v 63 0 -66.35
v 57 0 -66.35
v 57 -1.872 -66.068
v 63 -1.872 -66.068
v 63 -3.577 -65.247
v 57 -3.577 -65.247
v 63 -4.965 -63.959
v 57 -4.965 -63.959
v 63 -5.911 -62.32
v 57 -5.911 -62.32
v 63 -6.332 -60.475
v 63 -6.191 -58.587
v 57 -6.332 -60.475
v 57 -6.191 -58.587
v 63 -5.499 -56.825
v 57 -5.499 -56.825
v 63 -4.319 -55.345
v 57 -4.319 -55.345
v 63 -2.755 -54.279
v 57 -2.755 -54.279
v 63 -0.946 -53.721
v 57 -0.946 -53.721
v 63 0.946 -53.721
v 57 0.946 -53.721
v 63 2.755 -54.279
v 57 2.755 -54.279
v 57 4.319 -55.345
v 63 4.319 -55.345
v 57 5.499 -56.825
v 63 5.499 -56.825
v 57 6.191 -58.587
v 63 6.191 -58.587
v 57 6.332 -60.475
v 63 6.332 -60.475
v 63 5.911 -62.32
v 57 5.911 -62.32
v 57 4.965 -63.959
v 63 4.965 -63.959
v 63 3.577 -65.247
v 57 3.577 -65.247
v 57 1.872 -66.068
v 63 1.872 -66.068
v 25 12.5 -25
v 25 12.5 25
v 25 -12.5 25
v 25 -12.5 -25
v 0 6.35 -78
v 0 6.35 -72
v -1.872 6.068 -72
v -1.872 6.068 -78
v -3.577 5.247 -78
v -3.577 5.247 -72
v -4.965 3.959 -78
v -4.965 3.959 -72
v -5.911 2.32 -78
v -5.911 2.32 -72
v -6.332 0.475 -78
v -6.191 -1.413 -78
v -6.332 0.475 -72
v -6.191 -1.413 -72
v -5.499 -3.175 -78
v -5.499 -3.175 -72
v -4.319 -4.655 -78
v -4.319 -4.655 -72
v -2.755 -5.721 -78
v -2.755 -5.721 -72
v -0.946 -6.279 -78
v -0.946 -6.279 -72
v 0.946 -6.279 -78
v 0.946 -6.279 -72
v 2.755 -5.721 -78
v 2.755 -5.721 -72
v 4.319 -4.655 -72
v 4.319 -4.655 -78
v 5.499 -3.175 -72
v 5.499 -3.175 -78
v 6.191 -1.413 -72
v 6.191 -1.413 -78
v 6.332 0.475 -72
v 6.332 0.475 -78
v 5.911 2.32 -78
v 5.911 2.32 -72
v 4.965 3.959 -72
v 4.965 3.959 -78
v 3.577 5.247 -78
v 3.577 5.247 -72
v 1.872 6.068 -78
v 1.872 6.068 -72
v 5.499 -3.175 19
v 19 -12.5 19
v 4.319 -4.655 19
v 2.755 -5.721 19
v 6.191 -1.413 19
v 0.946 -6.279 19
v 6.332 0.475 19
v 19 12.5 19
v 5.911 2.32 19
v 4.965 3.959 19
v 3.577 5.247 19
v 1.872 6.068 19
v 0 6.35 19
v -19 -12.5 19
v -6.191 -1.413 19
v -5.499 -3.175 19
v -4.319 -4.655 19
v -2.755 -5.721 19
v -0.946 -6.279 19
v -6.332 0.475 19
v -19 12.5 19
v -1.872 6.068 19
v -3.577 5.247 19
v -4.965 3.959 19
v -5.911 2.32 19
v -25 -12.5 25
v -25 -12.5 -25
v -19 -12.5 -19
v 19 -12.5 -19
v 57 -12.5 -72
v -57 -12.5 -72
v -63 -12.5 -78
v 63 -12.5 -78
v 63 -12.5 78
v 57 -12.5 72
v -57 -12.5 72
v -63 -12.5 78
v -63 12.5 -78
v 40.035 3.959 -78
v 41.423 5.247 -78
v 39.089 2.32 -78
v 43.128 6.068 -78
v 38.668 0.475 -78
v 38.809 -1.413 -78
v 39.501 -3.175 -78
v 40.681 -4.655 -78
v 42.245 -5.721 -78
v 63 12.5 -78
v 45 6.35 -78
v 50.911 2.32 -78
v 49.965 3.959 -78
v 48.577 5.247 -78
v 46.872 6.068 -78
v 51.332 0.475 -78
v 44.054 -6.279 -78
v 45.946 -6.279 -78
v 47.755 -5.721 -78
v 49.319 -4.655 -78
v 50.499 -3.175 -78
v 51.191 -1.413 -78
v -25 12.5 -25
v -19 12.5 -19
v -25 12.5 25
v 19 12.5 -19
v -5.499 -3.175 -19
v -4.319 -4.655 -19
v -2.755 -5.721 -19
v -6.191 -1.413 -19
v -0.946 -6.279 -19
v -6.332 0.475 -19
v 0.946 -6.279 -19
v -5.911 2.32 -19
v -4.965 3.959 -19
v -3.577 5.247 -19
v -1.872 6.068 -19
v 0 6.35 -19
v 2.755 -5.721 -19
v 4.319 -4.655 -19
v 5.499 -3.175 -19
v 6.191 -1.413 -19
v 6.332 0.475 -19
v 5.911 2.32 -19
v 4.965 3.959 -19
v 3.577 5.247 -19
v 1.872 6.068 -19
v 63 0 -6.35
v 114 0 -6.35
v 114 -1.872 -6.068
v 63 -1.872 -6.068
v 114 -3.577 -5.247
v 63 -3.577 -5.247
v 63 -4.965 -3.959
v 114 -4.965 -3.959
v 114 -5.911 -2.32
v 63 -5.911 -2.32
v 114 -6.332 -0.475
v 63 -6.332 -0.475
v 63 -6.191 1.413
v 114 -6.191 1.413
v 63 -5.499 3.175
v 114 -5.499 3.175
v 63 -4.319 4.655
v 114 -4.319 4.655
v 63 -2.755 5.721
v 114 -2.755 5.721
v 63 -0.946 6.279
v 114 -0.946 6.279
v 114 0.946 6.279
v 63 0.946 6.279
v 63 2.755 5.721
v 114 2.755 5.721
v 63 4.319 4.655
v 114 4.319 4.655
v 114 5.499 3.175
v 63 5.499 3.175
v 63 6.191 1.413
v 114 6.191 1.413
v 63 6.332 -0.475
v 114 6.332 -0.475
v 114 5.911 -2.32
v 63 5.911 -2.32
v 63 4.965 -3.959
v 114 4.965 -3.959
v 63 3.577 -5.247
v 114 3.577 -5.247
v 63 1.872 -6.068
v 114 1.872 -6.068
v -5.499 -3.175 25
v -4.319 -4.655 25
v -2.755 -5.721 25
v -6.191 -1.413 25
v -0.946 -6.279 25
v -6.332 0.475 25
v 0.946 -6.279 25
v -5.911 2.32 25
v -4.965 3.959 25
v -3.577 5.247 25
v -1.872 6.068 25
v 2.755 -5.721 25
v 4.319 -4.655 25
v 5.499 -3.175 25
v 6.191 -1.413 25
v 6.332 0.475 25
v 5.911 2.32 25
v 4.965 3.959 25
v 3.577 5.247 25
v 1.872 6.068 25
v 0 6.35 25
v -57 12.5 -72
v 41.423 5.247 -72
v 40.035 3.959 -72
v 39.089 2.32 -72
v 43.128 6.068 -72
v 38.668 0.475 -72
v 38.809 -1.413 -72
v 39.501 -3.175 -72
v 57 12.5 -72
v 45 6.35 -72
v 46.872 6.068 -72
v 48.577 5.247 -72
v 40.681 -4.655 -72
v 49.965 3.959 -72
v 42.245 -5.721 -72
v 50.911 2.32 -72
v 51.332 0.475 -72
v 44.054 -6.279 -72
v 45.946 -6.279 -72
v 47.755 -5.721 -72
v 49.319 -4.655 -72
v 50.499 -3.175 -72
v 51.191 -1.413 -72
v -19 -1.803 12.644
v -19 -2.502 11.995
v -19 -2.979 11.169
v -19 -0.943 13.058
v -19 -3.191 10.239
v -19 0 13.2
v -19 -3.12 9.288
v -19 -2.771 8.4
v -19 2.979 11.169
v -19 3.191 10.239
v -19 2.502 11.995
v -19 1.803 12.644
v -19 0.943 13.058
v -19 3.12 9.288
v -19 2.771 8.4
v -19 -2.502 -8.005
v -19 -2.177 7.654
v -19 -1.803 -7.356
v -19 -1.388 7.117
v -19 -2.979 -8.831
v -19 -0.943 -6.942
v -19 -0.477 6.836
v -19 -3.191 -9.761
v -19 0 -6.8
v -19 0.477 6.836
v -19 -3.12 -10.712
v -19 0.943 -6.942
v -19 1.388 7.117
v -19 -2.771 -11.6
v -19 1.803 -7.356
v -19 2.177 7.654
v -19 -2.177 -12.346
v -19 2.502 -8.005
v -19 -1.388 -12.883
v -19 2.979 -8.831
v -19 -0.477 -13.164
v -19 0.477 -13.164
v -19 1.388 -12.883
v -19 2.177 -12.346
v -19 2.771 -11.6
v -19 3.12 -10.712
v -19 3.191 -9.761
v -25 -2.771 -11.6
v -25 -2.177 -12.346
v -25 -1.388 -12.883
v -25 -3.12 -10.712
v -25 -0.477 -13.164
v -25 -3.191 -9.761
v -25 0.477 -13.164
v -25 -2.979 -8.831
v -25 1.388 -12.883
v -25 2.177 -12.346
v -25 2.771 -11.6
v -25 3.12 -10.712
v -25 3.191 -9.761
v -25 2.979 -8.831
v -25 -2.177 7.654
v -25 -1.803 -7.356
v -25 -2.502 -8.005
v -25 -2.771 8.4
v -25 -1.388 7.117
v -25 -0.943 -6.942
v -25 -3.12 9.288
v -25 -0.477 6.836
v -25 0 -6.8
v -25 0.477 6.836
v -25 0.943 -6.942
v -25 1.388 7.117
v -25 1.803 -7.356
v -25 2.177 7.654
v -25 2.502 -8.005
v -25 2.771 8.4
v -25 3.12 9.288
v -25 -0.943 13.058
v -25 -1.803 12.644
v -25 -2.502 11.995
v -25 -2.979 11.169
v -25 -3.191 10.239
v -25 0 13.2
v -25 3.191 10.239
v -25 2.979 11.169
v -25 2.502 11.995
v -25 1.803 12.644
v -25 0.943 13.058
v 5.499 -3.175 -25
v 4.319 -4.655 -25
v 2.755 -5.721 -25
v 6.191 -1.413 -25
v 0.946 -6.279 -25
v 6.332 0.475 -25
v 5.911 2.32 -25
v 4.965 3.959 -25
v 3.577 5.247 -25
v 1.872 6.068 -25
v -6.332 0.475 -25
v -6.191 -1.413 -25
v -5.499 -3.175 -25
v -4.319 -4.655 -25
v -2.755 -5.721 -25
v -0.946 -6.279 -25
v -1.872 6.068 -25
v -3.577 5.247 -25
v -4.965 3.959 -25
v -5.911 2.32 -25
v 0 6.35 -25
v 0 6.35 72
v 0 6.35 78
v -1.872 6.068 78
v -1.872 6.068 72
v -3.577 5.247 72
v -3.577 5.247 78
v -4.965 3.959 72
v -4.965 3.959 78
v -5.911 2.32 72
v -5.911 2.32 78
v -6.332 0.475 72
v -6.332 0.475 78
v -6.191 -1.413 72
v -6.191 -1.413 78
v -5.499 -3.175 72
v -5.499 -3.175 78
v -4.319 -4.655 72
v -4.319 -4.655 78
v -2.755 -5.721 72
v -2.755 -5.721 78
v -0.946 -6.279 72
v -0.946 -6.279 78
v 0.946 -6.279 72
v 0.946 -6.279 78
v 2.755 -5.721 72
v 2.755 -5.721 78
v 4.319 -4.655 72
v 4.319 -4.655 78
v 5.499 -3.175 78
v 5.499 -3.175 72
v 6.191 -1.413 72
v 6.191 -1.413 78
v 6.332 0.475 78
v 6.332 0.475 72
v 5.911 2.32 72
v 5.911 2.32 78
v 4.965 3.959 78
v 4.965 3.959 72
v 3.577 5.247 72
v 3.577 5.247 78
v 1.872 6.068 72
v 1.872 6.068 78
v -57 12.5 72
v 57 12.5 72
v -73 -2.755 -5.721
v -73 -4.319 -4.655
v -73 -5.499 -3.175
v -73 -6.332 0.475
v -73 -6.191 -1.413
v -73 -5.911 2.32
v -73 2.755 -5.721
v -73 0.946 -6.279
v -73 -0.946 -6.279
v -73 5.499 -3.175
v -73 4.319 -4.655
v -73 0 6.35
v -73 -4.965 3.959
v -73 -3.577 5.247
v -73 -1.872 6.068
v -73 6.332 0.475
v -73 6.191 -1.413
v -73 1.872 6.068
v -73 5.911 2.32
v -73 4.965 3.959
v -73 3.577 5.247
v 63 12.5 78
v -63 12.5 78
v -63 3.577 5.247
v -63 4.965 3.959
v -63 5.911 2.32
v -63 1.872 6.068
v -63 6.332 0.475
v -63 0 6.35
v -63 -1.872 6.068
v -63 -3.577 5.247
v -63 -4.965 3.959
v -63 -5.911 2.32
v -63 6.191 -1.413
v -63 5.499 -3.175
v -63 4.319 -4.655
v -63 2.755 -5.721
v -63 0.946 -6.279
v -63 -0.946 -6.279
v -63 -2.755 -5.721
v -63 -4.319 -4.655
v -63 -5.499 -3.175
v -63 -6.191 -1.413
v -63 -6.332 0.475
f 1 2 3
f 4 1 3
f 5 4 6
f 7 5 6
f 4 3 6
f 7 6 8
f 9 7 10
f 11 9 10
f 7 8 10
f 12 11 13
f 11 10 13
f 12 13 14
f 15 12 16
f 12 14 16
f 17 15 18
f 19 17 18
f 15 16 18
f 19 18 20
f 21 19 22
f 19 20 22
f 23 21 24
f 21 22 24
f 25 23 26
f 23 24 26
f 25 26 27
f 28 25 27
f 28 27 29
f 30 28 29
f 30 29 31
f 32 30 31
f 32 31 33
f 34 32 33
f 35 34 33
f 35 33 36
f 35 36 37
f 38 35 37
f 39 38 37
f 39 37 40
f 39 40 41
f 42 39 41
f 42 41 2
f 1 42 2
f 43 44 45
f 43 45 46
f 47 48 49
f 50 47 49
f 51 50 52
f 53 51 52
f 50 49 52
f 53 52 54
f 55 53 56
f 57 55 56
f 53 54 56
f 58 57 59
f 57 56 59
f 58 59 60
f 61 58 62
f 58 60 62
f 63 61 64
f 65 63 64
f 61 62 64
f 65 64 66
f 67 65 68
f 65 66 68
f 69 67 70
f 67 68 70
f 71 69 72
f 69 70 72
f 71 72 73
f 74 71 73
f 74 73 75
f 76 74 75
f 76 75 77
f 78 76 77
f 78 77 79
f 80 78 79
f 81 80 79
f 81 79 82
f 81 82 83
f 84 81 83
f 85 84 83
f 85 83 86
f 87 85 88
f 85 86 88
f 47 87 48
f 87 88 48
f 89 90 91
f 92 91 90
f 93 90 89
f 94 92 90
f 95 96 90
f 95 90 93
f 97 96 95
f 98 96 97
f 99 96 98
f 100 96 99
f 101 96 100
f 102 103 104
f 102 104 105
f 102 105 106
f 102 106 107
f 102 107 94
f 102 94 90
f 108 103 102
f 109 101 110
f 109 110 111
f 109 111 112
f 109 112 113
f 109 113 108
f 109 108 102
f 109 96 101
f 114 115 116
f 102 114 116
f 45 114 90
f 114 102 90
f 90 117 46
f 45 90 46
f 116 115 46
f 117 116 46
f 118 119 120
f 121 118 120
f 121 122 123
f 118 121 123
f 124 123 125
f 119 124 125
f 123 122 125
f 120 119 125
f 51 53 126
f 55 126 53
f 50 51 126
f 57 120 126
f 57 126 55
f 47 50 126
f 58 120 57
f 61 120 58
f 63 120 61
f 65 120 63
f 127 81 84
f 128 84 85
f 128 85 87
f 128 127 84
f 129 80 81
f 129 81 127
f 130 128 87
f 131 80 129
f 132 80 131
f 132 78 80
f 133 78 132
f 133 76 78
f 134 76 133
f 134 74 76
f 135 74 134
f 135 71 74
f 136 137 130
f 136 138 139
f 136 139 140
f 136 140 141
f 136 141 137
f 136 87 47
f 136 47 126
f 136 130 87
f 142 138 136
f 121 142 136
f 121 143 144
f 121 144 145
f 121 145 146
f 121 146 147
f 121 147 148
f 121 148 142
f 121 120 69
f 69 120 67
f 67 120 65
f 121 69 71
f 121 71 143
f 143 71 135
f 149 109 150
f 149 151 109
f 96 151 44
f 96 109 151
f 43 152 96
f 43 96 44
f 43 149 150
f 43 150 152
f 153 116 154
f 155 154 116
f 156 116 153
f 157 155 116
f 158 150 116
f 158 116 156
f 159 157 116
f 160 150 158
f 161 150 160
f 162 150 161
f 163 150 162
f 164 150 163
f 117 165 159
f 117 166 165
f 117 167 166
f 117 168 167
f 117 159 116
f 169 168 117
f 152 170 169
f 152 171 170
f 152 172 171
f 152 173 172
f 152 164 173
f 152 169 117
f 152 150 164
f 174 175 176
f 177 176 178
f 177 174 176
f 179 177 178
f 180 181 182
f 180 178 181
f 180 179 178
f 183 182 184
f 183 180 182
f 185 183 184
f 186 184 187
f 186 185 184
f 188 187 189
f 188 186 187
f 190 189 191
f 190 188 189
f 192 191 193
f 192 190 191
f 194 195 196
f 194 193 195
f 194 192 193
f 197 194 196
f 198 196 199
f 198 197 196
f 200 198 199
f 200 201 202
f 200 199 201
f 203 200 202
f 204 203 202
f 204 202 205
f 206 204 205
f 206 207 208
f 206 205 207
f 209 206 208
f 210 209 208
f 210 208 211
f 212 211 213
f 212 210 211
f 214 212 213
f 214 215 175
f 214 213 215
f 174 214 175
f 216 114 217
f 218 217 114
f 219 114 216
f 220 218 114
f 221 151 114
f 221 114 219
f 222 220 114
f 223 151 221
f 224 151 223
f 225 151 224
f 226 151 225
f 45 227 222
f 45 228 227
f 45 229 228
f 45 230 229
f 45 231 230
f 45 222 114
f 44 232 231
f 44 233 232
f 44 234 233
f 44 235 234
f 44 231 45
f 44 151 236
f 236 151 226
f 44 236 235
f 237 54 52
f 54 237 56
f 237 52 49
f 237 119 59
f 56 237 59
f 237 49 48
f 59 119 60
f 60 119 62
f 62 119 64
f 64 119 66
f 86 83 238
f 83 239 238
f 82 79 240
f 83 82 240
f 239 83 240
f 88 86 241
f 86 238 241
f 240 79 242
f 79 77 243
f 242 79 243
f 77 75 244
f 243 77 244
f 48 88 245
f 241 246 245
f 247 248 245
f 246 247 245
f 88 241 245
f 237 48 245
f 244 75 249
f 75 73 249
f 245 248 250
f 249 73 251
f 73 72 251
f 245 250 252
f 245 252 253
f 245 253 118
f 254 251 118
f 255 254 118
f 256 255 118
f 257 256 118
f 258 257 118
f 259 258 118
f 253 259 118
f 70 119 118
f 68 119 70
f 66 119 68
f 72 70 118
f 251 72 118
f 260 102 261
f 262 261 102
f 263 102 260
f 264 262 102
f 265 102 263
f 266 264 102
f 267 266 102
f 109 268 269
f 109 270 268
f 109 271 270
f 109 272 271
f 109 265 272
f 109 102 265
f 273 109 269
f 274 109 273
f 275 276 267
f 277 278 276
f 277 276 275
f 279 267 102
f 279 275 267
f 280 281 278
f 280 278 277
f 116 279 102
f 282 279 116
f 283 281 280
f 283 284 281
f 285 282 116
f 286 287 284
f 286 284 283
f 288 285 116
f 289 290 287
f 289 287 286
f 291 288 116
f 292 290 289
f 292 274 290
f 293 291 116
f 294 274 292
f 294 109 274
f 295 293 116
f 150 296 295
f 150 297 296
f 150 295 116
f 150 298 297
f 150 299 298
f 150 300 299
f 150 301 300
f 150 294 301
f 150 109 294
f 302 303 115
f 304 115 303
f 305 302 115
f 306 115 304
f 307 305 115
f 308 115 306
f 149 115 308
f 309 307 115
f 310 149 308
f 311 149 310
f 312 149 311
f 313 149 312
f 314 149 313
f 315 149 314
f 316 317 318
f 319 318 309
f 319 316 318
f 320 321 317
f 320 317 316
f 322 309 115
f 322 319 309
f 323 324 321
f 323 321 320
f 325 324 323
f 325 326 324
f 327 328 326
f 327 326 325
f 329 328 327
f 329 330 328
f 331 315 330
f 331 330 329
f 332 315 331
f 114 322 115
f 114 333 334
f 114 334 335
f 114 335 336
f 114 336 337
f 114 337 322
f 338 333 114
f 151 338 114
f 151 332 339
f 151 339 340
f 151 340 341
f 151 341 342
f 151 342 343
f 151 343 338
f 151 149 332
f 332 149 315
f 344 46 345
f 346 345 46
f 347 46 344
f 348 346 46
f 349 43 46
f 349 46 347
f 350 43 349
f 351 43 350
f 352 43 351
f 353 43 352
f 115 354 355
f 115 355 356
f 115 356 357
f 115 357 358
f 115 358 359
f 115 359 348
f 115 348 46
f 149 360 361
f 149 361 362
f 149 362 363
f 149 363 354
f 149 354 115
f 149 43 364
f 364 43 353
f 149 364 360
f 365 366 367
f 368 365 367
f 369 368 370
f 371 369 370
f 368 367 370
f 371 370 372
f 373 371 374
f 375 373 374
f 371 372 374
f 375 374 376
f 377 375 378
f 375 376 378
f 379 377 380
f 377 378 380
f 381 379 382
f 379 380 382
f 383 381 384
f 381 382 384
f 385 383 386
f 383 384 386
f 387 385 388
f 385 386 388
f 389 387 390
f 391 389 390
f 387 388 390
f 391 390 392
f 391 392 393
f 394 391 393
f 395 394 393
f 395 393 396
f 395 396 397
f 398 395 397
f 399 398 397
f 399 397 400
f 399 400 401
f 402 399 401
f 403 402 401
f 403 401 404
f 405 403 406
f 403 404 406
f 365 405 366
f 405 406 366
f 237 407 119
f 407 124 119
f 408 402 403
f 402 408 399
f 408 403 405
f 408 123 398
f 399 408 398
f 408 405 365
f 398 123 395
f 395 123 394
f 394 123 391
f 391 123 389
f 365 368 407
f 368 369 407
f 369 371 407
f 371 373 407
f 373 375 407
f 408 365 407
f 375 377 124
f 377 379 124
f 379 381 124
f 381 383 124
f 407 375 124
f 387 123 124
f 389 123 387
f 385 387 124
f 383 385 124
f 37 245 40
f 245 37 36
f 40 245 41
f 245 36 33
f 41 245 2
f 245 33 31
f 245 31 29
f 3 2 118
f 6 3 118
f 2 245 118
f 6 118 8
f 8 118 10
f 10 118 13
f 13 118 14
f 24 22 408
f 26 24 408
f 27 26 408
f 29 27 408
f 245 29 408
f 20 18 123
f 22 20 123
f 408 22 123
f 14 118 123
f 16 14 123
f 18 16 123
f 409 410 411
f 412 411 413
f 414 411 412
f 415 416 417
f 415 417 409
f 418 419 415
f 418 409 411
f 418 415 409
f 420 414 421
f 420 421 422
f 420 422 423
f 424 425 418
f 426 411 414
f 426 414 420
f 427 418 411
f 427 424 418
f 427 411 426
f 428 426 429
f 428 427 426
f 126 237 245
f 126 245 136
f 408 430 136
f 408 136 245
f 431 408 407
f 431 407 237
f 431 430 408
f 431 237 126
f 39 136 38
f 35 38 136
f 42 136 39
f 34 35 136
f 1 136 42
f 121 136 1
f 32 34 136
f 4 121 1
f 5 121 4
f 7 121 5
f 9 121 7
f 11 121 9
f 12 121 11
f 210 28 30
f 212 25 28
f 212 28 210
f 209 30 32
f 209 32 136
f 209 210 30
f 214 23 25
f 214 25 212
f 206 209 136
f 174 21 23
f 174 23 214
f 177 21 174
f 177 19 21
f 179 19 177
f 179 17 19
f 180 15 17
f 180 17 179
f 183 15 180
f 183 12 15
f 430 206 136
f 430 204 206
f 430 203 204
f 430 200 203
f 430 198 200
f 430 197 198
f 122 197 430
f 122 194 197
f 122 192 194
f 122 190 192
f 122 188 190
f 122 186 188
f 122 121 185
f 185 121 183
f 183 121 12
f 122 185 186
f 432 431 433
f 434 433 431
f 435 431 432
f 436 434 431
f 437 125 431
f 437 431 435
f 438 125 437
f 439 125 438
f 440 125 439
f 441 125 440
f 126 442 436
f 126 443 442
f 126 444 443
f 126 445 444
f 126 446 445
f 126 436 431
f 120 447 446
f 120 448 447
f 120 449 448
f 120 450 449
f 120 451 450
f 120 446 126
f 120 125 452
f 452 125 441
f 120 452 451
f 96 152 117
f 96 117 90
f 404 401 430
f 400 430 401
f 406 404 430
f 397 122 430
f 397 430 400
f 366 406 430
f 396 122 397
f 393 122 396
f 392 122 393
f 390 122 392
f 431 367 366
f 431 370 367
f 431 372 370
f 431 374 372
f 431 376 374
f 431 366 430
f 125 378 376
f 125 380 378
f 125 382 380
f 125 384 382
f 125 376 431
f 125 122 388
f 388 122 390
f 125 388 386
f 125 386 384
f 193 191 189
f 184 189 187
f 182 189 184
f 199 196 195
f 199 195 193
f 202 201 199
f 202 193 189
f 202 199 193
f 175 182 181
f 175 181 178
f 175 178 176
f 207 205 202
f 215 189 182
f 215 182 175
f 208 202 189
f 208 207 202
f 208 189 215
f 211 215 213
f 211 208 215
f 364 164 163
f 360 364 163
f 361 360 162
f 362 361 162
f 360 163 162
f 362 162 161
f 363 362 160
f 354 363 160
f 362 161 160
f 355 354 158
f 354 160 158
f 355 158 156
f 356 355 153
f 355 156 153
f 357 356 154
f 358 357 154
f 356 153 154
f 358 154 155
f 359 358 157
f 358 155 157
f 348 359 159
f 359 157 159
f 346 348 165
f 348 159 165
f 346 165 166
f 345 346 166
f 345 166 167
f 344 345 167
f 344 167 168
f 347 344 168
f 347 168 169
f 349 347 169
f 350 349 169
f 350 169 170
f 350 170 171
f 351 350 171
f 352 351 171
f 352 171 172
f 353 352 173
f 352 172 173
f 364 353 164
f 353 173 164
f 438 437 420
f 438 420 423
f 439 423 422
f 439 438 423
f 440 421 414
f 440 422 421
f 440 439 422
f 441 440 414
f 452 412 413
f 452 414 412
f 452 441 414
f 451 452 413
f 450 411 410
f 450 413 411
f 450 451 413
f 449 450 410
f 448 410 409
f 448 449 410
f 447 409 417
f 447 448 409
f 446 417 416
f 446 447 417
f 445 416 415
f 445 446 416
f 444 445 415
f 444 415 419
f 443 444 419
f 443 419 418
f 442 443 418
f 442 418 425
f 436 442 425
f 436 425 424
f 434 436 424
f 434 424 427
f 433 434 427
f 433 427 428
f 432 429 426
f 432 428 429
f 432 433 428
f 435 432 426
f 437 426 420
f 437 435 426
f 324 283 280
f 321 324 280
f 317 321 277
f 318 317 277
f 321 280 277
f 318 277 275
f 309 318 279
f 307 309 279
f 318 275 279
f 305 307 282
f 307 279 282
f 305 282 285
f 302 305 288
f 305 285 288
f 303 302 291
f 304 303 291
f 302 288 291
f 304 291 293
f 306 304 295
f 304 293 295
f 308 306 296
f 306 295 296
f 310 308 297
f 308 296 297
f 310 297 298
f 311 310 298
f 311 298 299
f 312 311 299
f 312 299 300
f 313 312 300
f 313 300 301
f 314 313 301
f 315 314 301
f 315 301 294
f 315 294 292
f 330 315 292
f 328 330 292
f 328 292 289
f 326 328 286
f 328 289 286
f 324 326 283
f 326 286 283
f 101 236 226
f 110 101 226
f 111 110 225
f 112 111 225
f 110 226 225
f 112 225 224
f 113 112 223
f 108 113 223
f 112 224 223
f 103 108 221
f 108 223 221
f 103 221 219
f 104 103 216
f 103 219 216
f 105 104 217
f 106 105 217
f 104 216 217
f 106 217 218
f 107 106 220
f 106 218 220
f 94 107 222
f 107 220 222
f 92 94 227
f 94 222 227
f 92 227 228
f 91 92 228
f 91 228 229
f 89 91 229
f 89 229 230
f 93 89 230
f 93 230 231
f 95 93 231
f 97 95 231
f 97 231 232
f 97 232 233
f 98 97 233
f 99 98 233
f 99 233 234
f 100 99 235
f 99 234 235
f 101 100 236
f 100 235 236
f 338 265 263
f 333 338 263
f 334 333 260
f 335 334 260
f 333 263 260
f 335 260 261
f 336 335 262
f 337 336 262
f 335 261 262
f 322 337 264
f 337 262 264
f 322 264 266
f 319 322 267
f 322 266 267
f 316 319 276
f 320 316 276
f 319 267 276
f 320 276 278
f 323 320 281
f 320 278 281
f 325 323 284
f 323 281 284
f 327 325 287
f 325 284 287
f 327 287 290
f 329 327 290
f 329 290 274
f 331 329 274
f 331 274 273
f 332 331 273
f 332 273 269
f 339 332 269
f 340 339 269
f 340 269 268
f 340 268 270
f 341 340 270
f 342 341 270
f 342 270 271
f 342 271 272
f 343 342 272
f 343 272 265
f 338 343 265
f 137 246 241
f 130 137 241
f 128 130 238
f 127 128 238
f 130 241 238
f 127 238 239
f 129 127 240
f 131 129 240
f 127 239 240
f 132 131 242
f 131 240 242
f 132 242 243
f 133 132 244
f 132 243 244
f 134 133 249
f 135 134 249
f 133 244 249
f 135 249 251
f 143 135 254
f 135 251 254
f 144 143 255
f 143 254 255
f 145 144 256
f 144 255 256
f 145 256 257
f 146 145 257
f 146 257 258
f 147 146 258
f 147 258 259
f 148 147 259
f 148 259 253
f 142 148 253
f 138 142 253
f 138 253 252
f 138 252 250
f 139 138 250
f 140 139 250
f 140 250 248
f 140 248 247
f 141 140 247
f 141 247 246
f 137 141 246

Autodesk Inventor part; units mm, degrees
ref_plane "YZ Plane" through (0, 0, 0) normal (1, 0, 0) x (0, 1, 0)
ref_plane "XZ Plane" through (0, 0, 0) normal (0, 1, 0) x (-1, 0, 0)
ref_plane "XY Plane" through (0, 0, 0) normal (0, 0, 1) x (1, 0, 0)
sketch "Sketch1" plane through (0, 0, 0) normal (0, 1, 0) x (-1, 0, 0)
  line L0 (-63, 78) -> (63, 78)
  line L1 (63, 78) -> (63, -78)
  line L2 (63, -78) -> (-63, -78)
  line L3 (-63, -78) -> (-63, 78)
  line L4 (-63, 78) -> (63, -78) construction
  line L5 (63, 78) -> (-63, -78) construction
  line L6 (-57, 72) -> (57, 72)
  line L7 (57, 72) -> (57, -72)
  line L8 (57, -72) -> (-57, -72)
  line L9 (-57, -72) -> (-57, 72)
  line L10 (-57, 72) -> (57, -72) construction
  line L11 (57, 72) -> (-57, -72) construction
  point P0 (0, 0)
  dimension "d0" = 126
  dimension "d1" = 156
  dimension "d2" = 114
  dimension "d3" = 144
  dimension "d49" = 156
extrude "Extrusion1" add sketch "Sketch1" along normal mid plane 25
sketch "Sketch2" plane through (0, 12.5, 0) normal (0, 1, 0) x (1, 0, 0)
  line L0 (-25, -25) -> (25, -25)
  line L1 (25, -25) -> (25, 25)
  line L2 (25, 25) -> (-25, 25)
  line L3 (-25, 25) -> (-25, -25)
  line L4 (-25, -25) -> (25, 25) construction
  line L5 (25, -25) -> (-25, 25) construction
  line L6 (-19, 19) -> (19, 19)
  line L7 (19, 19) -> (19, -19)
  line L8 (19, -19) -> (-19, -19)
  line L9 (-19, -19) -> (-19, 19)
  point P0 (0, 0)
  dimension "d6" = 50
  dimension "d7" = 50
  dimension "d8" = 6
extrude "Extrusion2" add sketch "Sketch2" against normal blind 25
sketch "Sketch3" plane through (25, 12.5, -25) normal (0, 0, -1) x (-1, 0, 0)
  circle A0 centre (25, -12.5) radius 6.35
  dimension "d11" = 12.7
sketch "Sketch6" plane through (63, -12.5, -78) normal (1, 0, 0) x (0, 0, -1)
  circle A0 centre (-78, 12.5) radius 6.35
  dimension "d22" = 12.7
extrude "Extrusion6" add sketch "Sketch6" along normal blind 51
sketch "Sketch7" plane through (-63, -12.5, 78) normal (-1, 0, 0) x (0, 0, 1)
  circle A0 centre (-78, 12.5) radius 6.35
  dimension "d25" = 12.7
extrude "Extrusion7" add sketch "Sketch7" along normal blind 10
sketch "Sketch8" plane through (63, 12.5, -78) normal (0, 0, -1) x (-1, 0, 0)
  point P0 (63, -12.5)
  point P1 (18, -12.5)
  point P2 (63, -12.5)
hole "Hole1" at (45, 0, -78) direction (0, 0, 1) diameter 12.7 depth 6
sketch "Sketch9" plane through (63, -12.5, -78) normal (1, 0, 0) x (0, 0, -1)
  point P0 (-78, 12.5)
  point P1 (-18, 12.5)
  point P2 (-78, 12.5)
  point P3 (-78, 12.5)
hole "Hole2" at (63, 0, -60) direction (-1, 0, 0) diameter 12.7 depth 6
sketch "Sketch10" plane through (63, 12.5, -78) normal (0, 0, -1) x (-1, 0, 0)
  point P0 (63, -12.5)
  point P1 (63, -12.5)
hole "Hole3" at (0, 0, -78) direction (0, 0, 1) diameter 12.7 end through all
sketch "Sketch11" plane through (-25, 12.5, -25) normal (-1, 0, 0) x (0, 0, 1)
  point P0 (25, -12.5)
  point P1 (15, -12.5)
  point P2 (35, -12.5)
hole "Hole4" at (-25, 0, 10) direction (1, 0, 0) diameter 6.4 depth 6
sketch "Sketch12" plane through (-25, 12.5, -25) normal (-1, 0, 0) x (0, 0, 1)
  point P0 (25, -12.5)
  point P1 (15, -12.5)
hole "Hole5" at (-25, 0, -10) direction (1, 0, 0) diameter 6.4 depth 6
properties part number "Frame"
